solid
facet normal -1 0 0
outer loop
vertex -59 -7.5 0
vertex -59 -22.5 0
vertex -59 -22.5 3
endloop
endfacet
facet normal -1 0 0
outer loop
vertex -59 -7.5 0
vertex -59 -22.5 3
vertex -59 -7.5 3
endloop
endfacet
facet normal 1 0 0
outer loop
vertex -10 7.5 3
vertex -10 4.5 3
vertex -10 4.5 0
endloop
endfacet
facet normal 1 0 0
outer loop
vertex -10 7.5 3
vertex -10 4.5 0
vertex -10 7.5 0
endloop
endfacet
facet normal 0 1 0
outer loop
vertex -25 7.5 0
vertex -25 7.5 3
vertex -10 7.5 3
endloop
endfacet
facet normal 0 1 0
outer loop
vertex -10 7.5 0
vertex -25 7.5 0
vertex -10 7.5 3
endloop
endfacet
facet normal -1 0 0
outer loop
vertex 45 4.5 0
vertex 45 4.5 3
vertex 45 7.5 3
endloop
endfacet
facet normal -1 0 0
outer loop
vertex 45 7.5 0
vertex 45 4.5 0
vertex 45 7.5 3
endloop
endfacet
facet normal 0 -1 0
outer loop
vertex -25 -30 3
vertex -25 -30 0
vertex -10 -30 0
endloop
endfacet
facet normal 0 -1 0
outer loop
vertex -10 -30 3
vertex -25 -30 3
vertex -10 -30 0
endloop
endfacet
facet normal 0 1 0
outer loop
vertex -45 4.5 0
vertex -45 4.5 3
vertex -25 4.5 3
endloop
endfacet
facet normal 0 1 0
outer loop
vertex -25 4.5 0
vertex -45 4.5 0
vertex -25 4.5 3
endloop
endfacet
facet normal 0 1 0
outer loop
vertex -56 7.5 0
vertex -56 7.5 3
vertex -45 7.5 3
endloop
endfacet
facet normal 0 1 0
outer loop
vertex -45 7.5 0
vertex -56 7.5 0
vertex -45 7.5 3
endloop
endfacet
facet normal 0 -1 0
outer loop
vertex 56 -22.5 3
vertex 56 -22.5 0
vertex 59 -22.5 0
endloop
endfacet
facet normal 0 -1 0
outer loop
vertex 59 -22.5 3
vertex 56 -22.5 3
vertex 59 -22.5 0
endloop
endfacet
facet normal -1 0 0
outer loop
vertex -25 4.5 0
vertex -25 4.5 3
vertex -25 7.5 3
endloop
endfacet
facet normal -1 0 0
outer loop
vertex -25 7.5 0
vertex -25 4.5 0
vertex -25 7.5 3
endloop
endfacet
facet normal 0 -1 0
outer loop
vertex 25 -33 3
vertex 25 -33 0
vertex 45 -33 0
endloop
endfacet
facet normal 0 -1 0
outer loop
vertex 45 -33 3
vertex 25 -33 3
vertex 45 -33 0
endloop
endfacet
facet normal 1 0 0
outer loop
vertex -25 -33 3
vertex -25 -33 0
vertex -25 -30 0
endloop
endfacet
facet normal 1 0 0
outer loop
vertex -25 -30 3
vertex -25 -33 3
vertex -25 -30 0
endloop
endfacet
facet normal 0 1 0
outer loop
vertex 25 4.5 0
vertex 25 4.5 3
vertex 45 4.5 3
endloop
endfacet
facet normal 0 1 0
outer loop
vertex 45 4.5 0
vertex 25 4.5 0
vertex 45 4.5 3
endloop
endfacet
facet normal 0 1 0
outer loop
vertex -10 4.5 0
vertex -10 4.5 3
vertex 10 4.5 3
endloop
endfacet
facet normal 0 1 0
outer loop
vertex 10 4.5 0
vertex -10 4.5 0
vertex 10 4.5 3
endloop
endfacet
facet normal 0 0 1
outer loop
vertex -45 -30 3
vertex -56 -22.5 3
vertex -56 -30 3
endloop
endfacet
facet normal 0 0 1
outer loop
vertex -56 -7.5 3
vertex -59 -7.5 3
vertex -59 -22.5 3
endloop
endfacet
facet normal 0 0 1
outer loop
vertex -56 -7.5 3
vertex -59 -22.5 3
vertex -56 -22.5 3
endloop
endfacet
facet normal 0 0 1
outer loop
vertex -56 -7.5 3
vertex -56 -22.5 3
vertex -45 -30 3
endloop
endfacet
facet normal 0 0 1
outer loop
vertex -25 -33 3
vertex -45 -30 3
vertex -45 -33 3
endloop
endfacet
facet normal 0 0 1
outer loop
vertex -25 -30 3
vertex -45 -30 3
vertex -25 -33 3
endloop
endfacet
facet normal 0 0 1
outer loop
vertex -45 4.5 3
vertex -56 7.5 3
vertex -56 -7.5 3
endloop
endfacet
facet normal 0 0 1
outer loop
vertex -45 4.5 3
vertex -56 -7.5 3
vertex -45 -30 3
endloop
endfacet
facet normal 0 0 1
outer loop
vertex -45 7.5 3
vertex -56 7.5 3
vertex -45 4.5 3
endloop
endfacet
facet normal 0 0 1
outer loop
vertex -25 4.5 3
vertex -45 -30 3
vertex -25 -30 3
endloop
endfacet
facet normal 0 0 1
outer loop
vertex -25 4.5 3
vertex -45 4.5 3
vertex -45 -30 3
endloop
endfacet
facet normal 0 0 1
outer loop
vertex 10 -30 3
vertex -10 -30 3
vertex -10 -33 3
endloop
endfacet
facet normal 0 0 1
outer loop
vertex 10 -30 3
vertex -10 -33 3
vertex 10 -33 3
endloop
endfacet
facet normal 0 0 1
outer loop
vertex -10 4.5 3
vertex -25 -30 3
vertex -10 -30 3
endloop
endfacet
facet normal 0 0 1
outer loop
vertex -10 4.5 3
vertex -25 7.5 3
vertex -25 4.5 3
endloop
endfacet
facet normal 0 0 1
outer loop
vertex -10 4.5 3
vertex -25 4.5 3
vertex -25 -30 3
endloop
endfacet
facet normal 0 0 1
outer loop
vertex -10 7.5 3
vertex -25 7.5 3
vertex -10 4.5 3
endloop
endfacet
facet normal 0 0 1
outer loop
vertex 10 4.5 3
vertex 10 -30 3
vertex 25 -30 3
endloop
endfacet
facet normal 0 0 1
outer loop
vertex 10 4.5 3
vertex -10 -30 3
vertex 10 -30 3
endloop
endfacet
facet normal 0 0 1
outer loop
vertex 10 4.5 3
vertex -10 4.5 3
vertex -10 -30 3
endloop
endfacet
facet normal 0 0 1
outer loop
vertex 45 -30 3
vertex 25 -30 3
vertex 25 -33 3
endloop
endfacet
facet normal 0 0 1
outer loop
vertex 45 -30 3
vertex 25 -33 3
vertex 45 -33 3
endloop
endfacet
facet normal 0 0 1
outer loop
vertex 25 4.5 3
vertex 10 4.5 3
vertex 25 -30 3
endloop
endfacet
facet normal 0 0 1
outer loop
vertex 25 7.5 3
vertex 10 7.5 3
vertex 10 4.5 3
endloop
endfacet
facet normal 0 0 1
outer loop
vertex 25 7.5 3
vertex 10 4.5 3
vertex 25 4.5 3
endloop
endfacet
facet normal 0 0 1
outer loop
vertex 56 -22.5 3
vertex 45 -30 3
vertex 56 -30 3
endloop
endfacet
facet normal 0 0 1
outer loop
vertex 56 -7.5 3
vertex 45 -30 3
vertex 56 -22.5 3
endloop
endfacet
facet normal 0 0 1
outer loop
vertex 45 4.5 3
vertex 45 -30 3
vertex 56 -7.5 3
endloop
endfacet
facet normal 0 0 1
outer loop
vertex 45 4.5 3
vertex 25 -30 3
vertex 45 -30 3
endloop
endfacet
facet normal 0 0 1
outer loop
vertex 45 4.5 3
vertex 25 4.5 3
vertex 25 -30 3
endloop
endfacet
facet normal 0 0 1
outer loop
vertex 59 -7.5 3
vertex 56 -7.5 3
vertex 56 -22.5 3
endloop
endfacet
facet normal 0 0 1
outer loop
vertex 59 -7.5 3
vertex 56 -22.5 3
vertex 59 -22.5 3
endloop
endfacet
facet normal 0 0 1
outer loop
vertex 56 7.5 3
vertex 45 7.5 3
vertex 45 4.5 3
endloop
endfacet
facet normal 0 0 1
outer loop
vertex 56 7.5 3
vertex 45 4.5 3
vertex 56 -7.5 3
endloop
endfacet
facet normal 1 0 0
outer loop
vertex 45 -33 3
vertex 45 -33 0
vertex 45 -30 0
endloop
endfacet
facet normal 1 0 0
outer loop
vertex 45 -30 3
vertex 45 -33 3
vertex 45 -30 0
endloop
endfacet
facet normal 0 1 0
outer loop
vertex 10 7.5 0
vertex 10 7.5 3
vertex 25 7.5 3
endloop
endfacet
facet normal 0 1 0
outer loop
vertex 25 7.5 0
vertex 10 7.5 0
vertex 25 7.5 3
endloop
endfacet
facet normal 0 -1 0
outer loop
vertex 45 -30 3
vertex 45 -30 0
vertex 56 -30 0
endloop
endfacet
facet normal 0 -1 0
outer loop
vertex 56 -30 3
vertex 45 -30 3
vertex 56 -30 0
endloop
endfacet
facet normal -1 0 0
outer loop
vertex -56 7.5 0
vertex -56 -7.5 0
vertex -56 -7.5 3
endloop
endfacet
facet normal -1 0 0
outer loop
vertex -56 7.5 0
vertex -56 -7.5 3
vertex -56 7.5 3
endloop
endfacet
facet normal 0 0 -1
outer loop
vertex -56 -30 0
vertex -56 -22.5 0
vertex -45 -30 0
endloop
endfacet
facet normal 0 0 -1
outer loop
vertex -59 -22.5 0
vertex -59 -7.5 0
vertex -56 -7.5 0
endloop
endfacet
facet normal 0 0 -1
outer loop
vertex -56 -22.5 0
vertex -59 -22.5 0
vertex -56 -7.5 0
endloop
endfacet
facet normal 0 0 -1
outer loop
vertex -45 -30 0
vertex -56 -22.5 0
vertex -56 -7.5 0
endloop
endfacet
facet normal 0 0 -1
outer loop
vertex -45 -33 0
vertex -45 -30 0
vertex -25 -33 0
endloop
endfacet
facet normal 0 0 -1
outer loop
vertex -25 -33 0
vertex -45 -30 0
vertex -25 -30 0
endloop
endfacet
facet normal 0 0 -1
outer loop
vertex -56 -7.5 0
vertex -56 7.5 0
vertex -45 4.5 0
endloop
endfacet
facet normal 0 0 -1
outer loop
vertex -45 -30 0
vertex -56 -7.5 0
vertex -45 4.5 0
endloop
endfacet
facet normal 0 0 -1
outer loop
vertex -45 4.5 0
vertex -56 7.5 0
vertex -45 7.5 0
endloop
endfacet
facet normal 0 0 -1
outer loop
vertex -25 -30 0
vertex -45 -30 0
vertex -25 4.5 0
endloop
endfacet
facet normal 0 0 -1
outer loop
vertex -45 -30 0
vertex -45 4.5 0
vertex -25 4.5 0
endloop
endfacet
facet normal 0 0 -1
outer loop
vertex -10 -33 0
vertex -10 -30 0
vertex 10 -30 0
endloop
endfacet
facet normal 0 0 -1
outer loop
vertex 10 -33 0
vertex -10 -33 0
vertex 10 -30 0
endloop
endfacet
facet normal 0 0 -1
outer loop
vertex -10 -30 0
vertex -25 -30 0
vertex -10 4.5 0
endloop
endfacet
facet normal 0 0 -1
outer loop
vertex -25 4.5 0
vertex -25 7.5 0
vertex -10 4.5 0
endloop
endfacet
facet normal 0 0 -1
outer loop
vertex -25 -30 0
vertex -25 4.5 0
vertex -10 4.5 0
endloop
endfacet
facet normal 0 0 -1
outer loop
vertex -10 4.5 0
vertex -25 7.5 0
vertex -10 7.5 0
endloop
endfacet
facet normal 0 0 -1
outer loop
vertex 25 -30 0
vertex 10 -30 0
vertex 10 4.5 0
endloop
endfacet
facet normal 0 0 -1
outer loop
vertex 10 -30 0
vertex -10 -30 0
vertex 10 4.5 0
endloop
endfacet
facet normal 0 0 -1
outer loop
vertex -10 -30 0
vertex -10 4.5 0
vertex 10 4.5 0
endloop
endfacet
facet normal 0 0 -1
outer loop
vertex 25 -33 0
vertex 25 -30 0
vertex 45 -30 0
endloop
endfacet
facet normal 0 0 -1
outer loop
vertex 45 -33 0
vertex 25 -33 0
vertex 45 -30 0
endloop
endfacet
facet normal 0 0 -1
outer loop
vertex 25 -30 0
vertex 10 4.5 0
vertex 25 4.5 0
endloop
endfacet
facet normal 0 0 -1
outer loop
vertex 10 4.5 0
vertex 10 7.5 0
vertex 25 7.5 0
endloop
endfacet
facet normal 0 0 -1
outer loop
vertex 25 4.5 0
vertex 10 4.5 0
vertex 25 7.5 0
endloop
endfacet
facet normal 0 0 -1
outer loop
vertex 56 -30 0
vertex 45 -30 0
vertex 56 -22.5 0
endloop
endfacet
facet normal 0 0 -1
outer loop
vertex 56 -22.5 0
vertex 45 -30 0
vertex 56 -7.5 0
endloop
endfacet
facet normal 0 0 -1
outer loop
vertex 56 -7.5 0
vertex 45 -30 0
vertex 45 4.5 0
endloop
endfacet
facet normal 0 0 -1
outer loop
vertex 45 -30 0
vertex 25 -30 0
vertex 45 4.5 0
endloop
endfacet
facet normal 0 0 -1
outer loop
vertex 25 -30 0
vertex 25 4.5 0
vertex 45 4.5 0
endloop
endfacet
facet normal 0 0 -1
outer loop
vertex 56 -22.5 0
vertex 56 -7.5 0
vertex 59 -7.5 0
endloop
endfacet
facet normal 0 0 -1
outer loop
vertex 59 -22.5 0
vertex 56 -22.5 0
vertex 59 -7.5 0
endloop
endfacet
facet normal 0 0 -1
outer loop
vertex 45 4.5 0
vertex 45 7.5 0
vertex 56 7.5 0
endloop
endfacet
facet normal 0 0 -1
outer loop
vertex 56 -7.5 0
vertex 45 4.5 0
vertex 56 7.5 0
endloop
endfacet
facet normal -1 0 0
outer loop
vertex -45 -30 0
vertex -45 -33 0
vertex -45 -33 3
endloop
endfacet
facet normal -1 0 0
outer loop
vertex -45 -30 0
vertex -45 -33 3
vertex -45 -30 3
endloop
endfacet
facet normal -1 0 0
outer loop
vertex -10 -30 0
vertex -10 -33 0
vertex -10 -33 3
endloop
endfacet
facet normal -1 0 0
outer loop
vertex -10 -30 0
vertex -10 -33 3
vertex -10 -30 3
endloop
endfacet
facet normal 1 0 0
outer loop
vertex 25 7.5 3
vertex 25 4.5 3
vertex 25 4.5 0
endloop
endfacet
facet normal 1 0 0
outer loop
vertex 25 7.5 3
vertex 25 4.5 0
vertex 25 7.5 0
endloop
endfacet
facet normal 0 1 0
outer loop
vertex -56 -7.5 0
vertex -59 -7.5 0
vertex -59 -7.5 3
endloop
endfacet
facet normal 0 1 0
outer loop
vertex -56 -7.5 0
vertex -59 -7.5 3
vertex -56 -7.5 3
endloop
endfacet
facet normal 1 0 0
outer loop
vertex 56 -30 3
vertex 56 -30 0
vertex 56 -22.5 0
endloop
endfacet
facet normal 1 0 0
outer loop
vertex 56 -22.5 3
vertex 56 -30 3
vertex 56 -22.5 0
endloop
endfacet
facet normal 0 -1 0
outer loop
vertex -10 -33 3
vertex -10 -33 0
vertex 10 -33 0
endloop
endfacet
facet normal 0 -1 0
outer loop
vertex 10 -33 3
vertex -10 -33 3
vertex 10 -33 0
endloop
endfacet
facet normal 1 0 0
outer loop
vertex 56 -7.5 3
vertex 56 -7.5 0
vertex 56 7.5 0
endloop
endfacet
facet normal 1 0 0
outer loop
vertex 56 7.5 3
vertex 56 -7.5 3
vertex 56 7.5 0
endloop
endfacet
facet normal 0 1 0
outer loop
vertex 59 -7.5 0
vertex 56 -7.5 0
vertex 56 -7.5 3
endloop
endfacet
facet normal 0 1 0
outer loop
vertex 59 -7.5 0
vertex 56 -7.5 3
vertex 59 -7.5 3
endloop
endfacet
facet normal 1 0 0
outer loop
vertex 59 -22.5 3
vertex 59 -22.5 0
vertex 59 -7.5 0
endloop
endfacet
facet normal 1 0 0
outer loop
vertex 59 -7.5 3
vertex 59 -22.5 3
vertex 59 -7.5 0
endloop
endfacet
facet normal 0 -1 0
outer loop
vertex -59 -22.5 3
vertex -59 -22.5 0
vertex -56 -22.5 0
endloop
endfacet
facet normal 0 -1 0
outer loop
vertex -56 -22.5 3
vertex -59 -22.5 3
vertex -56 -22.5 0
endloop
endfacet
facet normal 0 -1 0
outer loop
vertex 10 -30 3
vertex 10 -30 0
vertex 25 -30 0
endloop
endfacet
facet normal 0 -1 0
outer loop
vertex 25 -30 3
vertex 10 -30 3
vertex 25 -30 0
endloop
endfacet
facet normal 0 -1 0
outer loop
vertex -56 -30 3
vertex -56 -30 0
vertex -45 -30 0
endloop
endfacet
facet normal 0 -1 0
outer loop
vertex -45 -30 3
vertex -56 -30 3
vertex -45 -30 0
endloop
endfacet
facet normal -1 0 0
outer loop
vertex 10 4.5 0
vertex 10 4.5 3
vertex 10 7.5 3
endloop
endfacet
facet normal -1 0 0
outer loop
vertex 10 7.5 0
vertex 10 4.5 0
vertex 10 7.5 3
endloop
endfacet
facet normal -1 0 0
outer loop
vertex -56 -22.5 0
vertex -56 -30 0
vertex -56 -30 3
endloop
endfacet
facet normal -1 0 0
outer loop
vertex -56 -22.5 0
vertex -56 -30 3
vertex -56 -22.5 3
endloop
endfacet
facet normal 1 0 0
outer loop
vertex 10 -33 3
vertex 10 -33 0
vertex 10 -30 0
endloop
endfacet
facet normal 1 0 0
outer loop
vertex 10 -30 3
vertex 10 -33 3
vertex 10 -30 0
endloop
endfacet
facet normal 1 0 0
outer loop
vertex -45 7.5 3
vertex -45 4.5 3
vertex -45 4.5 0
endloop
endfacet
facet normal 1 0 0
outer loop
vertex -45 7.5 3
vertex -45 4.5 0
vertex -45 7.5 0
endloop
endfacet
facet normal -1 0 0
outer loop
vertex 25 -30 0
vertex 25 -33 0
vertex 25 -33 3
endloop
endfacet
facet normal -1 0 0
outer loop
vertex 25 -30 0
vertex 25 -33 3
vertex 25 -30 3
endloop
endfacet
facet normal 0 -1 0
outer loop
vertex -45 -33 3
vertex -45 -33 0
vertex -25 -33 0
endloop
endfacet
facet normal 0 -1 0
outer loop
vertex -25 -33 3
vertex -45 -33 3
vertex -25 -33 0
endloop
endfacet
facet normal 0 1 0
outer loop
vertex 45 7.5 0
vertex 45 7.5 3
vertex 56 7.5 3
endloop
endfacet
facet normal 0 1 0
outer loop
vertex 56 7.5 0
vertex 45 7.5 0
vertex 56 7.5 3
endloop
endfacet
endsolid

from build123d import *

# Parameters (mm, degrees)
SKETCH2_W           = 112
SKETCH2_H           = 60
SKETCH2_W_2         = 20
SKETCH2_H_2         = 3
SKETCH2_W_3         = 3
SKETCH2_H_3         = 15
BOSS_EXTRUDE1_DEPTH = 3
SKETCH4_W           = 20
SKETCH4_H           = 3
CUT_EXTRUDE2_DEPTH  = 10


with BuildPart() as part:
    # Sketch2 → Boss-Extrude1 (new body)
    with BuildSketch(Plane.XY):
        Rectangle(SKETCH2_W, SKETCH2_H)
        with Locations((-35, -31.5)):
            Rectangle(SKETCH2_W_2, SKETCH2_H_2)
        with Locations((0, -31.5)):
            Rectangle(SKETCH2_W_2, SKETCH2_H_2)
        with Locations((35, -31.5)):
            Rectangle(SKETCH2_W_2, SKETCH2_H_2)
        with Locations((57.5, -15)):
            Rectangle(SKETCH2_W_3, SKETCH2_H_3)
        with Locations((-57.5, -15)):
            Rectangle(SKETCH2_W_3, SKETCH2_H_3)
        with Locations((-57.5, 15)):
            Rectangle(SKETCH2_W_3, SKETCH2_H_3)
        with Locations((57.5, 15)):
            Rectangle(SKETCH2_W_3, SKETCH2_H_3)
    extrude(amount=BOSS_EXTRUDE1_DEPTH)

    # Sketch4 → Cut-Extrude2 (cut)
    with BuildSketch(Plane.XY.offset(3)):
        with Locations((-35, 6)):
            Rectangle(SKETCH4_W, SKETCH4_H)
        with Locations((0, 6)):
            Rectangle(SKETCH4_W, SKETCH4_H)
        with Locations((35, 6)):
            Rectangle(SKETCH4_W, SKETCH4_H)
        Polygon((-59, 22.5), (-59, 7.5), (-56, 7.5), (-45, 7.5), (-25, 7.5), (-10, 7.5), (10, 7.5), (25, 7.5), (45, 7.5), (56, 7.5), (59, 7.5), (59, 22.5), (56, 22.5), (56, 30), (-56, 30), (-56, 22.5), align=None)
    extrude(amount=-CUT_EXTRUDE2_DEPTH, mode=Mode.SUBTRACT)


solid = part.part
